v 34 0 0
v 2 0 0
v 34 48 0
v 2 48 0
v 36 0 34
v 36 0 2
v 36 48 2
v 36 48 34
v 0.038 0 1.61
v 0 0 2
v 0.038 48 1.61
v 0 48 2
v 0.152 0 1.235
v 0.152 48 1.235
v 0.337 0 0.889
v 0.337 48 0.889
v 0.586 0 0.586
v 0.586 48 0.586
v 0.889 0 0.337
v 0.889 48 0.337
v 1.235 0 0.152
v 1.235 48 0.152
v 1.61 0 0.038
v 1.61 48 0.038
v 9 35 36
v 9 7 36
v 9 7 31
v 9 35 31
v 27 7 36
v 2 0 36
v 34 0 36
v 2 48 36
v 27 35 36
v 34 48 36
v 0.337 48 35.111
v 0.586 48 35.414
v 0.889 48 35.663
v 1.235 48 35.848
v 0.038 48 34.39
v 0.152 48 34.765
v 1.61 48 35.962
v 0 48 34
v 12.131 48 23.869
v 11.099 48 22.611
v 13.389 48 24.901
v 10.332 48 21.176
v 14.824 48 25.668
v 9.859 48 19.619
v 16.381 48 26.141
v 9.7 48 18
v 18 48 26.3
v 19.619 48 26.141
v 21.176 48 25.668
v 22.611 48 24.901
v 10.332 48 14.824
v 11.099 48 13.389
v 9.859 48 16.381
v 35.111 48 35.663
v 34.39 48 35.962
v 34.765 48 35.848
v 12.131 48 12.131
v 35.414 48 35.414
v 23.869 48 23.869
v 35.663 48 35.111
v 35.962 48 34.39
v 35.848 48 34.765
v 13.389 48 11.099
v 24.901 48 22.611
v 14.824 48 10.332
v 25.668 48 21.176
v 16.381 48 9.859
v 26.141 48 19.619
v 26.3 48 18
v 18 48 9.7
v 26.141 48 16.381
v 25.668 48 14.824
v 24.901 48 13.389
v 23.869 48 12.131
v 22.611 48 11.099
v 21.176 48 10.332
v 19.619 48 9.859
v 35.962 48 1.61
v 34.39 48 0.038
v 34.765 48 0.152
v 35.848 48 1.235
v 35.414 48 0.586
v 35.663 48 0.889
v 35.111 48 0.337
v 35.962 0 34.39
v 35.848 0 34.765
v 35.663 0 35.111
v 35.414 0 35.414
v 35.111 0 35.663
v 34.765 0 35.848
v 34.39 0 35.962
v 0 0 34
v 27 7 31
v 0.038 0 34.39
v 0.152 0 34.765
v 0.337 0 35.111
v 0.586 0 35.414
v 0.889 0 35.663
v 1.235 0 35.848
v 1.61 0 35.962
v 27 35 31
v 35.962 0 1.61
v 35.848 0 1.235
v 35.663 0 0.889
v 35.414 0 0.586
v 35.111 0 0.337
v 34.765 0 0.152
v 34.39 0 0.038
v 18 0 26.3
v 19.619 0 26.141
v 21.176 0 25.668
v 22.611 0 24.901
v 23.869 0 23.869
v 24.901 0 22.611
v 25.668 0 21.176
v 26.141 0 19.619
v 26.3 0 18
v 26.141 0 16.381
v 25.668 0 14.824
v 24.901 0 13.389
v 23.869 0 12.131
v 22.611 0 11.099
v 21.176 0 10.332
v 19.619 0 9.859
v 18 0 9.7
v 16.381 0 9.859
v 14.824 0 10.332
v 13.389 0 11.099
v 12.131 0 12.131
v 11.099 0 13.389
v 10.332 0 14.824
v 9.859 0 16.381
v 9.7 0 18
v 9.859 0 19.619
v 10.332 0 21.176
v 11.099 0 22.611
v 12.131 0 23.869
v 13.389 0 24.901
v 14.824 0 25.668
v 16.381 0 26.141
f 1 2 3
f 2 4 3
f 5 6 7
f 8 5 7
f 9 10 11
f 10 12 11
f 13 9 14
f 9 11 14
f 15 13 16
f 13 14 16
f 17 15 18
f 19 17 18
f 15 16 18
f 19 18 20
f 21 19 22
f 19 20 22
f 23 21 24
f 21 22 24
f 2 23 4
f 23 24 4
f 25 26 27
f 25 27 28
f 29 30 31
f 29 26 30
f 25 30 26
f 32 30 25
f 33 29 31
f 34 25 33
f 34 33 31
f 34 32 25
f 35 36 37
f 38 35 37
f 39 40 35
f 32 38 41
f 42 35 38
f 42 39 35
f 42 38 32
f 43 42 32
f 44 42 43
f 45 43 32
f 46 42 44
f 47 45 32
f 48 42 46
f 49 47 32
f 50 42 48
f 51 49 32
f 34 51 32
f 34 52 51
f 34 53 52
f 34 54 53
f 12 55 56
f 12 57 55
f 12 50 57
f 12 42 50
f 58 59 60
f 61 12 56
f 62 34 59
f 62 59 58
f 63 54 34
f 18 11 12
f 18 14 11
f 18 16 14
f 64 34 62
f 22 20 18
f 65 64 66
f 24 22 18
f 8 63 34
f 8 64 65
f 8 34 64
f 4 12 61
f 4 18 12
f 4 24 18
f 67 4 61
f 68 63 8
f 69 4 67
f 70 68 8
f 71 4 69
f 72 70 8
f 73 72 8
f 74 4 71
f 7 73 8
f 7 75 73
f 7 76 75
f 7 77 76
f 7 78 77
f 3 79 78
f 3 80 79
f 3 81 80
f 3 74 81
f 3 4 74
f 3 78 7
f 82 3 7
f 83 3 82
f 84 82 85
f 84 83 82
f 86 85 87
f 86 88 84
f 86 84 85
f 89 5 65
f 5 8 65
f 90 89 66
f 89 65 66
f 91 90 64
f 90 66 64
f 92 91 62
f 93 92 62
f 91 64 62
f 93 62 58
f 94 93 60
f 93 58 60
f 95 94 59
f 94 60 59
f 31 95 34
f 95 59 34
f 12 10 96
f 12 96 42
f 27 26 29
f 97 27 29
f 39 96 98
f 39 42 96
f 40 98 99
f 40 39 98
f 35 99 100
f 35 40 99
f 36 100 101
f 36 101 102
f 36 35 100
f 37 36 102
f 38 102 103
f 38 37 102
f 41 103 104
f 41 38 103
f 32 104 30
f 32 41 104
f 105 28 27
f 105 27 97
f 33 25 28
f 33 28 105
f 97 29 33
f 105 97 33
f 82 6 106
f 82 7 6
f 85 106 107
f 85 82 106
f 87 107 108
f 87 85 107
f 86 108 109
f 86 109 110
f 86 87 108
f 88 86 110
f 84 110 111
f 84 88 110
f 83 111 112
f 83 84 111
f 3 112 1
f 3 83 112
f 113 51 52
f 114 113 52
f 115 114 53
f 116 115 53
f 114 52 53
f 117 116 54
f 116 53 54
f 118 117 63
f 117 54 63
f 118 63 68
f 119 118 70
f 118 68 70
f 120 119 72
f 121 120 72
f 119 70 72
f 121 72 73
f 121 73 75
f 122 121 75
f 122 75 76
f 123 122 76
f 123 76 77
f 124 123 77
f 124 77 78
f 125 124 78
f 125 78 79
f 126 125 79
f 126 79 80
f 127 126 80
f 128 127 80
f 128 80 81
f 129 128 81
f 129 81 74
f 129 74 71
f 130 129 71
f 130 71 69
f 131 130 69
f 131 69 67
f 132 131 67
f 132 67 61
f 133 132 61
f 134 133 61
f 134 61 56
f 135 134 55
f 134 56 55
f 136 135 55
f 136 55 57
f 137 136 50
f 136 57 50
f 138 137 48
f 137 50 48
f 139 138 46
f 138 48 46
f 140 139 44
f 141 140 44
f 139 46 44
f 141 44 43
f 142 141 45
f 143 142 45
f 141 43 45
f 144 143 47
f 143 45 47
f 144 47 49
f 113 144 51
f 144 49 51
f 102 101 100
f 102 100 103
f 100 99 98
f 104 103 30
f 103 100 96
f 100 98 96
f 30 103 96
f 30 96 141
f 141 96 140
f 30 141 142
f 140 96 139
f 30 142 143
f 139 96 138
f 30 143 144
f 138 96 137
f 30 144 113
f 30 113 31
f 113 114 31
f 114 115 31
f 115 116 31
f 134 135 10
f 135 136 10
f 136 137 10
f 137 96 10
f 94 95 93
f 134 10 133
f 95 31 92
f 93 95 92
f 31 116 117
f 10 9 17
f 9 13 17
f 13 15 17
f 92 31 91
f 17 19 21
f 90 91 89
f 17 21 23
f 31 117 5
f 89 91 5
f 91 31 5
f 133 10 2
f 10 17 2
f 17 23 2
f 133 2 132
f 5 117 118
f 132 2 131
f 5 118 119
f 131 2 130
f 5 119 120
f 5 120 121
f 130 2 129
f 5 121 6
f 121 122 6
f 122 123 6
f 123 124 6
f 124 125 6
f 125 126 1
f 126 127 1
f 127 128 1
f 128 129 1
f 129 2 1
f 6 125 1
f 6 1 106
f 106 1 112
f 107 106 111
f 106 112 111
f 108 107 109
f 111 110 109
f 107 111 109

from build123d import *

# Parameters (mm, degrees)
SKETCH_1_W          = 36
SKETCH_1_H          = 48
LIFT_CARRIAGE_DEPTH = 36
FILLET_2_R          = 2
SKETCH_2_W          = 18
SKETCH_2_H          = 28
FRONT_RECESS_DEPTH  = 5
SKETCH_3_R          = 8.3
SCREW_PASSAGE_DEPTH = 70.971422738


with BuildPart() as part:
    # 草图1 → Lift_carriage (new body)
    with BuildSketch(Plane.XY):
        with Locations((18, 24)):
            Rectangle(SKETCH_1_W, SKETCH_1_H)
    extrude(amount=LIFT_CARRIAGE_DEPTH)

    # Fillet 2
    fillet_2_edges = [part.edges().sort_by_distance(p)[0] for p in [
        (36, 24, 36),
        (0, 24, 36),
        (36, 24, 0),
        (0, 24, 0),
    ]]
    fillet(fillet_2_edges, radius=FILLET_2_R)

    # 草图2 → Front_recess (cut)
    with BuildSketch(Plane.XY.offset(36)):
        with Locations((18, 21)):
            Rectangle(SKETCH_2_W, SKETCH_2_H)
    extrude(amount=-FRONT_RECESS_DEPTH, mode=Mode.SUBTRACT)

    # 草图3 → Screw_passage (cut, through all)
    with BuildSketch(Plane(origin=(0, 48, 0), x_dir=(1, 0, 0), z_dir=(0, 1, 0))):
        with Locations(Location((18, -18, 0), (0, 0, 270))):
            Circle(SKETCH_3_R)
    extrude(amount=-SCREW_PASSAGE_DEPTH, mode=Mode.SUBTRACT)


solid = part.part
